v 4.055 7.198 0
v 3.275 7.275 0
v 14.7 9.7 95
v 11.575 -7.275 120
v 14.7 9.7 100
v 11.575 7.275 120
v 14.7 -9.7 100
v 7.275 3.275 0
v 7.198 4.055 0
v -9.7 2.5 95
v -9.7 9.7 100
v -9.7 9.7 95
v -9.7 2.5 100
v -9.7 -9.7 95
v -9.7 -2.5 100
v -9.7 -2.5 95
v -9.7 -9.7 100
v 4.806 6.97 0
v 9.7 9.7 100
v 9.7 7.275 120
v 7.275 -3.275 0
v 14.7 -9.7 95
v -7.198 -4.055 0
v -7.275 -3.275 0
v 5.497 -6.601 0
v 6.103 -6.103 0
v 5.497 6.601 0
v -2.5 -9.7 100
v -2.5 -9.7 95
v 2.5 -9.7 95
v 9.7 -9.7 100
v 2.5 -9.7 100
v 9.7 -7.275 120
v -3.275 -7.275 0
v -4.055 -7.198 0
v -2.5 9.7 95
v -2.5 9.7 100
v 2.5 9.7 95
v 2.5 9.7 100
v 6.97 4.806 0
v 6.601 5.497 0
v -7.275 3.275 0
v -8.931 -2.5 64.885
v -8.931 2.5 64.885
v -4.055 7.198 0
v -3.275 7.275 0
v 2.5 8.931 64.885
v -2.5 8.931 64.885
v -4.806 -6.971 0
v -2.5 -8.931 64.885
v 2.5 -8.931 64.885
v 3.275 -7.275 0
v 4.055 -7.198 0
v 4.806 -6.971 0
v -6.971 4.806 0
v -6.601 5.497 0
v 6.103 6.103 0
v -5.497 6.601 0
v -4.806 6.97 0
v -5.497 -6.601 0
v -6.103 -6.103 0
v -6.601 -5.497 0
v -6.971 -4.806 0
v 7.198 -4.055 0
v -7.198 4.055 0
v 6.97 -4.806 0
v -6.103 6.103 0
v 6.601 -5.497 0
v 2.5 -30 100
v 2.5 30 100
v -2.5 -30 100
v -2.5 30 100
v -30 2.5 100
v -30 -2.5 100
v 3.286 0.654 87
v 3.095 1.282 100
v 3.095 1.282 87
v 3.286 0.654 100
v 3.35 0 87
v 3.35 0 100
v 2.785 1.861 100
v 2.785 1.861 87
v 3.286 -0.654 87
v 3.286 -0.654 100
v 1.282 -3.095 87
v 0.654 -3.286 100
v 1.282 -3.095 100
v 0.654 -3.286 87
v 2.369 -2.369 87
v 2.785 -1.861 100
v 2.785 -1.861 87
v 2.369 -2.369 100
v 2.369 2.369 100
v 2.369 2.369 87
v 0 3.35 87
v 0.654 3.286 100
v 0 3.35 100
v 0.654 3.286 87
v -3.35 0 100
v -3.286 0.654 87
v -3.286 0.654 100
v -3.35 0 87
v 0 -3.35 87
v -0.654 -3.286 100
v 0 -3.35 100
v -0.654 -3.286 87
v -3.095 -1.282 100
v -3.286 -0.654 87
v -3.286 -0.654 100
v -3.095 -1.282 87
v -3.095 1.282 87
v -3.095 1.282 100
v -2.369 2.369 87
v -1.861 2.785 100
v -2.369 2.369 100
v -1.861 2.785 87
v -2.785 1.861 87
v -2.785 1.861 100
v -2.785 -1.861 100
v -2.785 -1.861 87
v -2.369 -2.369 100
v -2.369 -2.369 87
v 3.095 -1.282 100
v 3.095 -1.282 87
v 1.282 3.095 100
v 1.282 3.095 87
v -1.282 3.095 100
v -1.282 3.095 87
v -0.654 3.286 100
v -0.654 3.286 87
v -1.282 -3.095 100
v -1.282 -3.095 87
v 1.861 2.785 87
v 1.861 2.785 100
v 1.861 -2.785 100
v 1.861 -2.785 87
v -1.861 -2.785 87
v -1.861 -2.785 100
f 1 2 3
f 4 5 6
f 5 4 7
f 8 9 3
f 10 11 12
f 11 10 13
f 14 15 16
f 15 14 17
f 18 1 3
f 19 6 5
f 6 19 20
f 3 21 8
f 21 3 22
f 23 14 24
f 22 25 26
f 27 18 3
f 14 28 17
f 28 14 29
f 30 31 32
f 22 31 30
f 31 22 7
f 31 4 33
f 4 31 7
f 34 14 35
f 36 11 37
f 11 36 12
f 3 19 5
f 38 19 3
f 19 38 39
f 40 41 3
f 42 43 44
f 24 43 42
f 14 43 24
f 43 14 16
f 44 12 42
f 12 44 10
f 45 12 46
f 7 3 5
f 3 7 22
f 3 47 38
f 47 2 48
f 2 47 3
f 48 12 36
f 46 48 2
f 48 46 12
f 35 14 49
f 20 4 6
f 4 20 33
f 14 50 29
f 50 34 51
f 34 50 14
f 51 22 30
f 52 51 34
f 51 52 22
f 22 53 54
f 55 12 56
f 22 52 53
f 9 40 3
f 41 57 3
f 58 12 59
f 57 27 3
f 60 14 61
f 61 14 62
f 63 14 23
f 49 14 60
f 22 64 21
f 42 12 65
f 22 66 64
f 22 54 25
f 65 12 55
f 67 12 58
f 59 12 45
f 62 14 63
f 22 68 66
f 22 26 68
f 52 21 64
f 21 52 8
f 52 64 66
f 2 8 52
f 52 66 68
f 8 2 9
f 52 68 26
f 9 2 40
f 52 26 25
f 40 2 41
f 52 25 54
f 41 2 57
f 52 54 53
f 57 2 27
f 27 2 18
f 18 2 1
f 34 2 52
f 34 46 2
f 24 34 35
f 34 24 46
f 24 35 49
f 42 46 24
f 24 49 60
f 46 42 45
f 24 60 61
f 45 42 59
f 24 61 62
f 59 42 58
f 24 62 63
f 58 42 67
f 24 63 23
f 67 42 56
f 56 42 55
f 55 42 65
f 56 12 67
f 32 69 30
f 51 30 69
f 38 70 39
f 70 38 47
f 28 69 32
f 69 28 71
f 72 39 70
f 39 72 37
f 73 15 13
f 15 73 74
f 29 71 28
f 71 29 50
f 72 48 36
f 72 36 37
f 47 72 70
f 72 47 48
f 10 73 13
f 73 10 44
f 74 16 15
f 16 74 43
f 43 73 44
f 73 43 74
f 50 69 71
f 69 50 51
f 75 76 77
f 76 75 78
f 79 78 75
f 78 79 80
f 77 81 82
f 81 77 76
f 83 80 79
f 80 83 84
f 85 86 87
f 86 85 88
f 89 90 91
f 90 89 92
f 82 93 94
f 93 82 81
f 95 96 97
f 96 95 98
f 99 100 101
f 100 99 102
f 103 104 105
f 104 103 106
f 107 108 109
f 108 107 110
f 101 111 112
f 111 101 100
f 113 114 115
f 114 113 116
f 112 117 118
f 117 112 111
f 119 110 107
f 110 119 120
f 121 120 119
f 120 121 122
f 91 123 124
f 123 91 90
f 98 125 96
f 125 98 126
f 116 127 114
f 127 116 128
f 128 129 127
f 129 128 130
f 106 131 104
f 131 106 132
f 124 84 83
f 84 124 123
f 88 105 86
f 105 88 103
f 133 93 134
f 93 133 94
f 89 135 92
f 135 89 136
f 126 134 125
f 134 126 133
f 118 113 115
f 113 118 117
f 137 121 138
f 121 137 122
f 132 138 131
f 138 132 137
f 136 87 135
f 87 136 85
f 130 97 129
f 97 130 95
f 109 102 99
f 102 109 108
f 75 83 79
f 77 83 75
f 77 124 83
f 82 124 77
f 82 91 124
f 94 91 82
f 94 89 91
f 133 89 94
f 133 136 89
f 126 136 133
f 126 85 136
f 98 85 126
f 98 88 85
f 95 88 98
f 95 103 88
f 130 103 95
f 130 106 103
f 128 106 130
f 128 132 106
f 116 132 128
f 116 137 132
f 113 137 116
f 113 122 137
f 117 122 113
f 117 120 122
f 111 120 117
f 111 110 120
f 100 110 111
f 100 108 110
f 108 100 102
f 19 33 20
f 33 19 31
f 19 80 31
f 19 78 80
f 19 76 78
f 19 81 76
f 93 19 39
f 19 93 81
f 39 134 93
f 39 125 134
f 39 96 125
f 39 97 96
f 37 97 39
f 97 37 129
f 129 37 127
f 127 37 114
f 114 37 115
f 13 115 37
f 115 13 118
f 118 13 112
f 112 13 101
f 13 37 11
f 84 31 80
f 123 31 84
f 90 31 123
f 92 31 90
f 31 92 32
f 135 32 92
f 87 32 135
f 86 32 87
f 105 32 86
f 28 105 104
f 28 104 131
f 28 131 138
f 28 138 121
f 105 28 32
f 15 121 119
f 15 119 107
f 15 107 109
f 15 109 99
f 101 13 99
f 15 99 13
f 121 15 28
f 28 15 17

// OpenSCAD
printerTolerance = 0.3;
$fn = 32;

holeXOffset = 6.5;
holeYOffset = 35;
dowelDiameter = 6.1;
dowelRadius = dowelDiameter/2;
dowelLength = 20;
dowelSocketDepth = 13;
footHeight = 100;
footWidth = holeXOffset * 2 + dowelDiameter + printerTolerance;
lipThickness = 5;
wallHeight = 20;
wallThickness = 5;
taperFactor = 0.75;
wingLength = 30;
wingHeight = 50;
wingThickness = 5;

isDouble = false;
includeWall = !isDouble;

if (isDouble) {
    translate([-footWidth/2, 0, 0]) footColumn();
    rotate([0, 0, 180]) translate([-footWidth/2, 0, 0]) footColumn();
} else {
    footColumn();
}

module roundedRect(w, h, r) {
    translate([-(w/2)+r, -(h/2)+r, 0]) minkowski() {
        square([w-2*r, h-2*r]);
        circle(r);
    }
}

module footColumn() {
    difference() {
        union() {
            hull() {
                linear_extrude(height = footHeight-lipThickness, scale = 1/taperFactor)
                    roundedRect(footWidth*taperFactor, footWidth*taperFactor, 4);
                if (isDouble) {
                    translate([footWidth/2, 0, 0])
                        rotate([0, 0, 180])
                        linear_extrude(height = footHeight-lipThickness, scale = 1/taperFactor)
                            translate([0, -footWidth*taperFactor/2, 0])
                                square([footWidth*taperFactor/2, footWidth*taperFactor]);
                }
                translate([0, 0, footHeight-(lipThickness/2)])
                    if (!includeWall) {
                        cube([footWidth, footWidth, lipThickness], center = true);
                    } else {
                        translate([wallThickness/2, 0, 0])
                            cube([footWidth + wallThickness, footWidth, lipThickness], center = true);
                    }
                if (includeWall) {
                    translate([footWidth/2, 0, footHeight])
                        linear_extrude(height = wallHeight, scale = taperFactor)
                            square([wallThickness, footWidth], center = true);
                }
            }
            rotate([0, 0, 0]) wing();
            rotate([0, 0, 90]) wing();
            rotate([0, 0, 180]) wing();
        }
        translate([0, 0, footHeight - dowelSocketDepth])
            cylinder(r = dowelRadius + printerTolerance, h = dowelLength);
        if (includeWall) {
            translate([-footWidth/2, -footWidth/2, footHeight])
                cube([footWidth, footWidth, wallHeight]);
        }
    }
}

module wing() {
    translate([0, 0, footHeight-wingHeight])
        rotate([0, -90, 0])
            translate([0, 0, -wingThickness/2])
                linear_extrude(height = wingThickness)
                    polygon([[0, 0], [wingHeight, 0], [wingHeight, wingLength]]);
}
